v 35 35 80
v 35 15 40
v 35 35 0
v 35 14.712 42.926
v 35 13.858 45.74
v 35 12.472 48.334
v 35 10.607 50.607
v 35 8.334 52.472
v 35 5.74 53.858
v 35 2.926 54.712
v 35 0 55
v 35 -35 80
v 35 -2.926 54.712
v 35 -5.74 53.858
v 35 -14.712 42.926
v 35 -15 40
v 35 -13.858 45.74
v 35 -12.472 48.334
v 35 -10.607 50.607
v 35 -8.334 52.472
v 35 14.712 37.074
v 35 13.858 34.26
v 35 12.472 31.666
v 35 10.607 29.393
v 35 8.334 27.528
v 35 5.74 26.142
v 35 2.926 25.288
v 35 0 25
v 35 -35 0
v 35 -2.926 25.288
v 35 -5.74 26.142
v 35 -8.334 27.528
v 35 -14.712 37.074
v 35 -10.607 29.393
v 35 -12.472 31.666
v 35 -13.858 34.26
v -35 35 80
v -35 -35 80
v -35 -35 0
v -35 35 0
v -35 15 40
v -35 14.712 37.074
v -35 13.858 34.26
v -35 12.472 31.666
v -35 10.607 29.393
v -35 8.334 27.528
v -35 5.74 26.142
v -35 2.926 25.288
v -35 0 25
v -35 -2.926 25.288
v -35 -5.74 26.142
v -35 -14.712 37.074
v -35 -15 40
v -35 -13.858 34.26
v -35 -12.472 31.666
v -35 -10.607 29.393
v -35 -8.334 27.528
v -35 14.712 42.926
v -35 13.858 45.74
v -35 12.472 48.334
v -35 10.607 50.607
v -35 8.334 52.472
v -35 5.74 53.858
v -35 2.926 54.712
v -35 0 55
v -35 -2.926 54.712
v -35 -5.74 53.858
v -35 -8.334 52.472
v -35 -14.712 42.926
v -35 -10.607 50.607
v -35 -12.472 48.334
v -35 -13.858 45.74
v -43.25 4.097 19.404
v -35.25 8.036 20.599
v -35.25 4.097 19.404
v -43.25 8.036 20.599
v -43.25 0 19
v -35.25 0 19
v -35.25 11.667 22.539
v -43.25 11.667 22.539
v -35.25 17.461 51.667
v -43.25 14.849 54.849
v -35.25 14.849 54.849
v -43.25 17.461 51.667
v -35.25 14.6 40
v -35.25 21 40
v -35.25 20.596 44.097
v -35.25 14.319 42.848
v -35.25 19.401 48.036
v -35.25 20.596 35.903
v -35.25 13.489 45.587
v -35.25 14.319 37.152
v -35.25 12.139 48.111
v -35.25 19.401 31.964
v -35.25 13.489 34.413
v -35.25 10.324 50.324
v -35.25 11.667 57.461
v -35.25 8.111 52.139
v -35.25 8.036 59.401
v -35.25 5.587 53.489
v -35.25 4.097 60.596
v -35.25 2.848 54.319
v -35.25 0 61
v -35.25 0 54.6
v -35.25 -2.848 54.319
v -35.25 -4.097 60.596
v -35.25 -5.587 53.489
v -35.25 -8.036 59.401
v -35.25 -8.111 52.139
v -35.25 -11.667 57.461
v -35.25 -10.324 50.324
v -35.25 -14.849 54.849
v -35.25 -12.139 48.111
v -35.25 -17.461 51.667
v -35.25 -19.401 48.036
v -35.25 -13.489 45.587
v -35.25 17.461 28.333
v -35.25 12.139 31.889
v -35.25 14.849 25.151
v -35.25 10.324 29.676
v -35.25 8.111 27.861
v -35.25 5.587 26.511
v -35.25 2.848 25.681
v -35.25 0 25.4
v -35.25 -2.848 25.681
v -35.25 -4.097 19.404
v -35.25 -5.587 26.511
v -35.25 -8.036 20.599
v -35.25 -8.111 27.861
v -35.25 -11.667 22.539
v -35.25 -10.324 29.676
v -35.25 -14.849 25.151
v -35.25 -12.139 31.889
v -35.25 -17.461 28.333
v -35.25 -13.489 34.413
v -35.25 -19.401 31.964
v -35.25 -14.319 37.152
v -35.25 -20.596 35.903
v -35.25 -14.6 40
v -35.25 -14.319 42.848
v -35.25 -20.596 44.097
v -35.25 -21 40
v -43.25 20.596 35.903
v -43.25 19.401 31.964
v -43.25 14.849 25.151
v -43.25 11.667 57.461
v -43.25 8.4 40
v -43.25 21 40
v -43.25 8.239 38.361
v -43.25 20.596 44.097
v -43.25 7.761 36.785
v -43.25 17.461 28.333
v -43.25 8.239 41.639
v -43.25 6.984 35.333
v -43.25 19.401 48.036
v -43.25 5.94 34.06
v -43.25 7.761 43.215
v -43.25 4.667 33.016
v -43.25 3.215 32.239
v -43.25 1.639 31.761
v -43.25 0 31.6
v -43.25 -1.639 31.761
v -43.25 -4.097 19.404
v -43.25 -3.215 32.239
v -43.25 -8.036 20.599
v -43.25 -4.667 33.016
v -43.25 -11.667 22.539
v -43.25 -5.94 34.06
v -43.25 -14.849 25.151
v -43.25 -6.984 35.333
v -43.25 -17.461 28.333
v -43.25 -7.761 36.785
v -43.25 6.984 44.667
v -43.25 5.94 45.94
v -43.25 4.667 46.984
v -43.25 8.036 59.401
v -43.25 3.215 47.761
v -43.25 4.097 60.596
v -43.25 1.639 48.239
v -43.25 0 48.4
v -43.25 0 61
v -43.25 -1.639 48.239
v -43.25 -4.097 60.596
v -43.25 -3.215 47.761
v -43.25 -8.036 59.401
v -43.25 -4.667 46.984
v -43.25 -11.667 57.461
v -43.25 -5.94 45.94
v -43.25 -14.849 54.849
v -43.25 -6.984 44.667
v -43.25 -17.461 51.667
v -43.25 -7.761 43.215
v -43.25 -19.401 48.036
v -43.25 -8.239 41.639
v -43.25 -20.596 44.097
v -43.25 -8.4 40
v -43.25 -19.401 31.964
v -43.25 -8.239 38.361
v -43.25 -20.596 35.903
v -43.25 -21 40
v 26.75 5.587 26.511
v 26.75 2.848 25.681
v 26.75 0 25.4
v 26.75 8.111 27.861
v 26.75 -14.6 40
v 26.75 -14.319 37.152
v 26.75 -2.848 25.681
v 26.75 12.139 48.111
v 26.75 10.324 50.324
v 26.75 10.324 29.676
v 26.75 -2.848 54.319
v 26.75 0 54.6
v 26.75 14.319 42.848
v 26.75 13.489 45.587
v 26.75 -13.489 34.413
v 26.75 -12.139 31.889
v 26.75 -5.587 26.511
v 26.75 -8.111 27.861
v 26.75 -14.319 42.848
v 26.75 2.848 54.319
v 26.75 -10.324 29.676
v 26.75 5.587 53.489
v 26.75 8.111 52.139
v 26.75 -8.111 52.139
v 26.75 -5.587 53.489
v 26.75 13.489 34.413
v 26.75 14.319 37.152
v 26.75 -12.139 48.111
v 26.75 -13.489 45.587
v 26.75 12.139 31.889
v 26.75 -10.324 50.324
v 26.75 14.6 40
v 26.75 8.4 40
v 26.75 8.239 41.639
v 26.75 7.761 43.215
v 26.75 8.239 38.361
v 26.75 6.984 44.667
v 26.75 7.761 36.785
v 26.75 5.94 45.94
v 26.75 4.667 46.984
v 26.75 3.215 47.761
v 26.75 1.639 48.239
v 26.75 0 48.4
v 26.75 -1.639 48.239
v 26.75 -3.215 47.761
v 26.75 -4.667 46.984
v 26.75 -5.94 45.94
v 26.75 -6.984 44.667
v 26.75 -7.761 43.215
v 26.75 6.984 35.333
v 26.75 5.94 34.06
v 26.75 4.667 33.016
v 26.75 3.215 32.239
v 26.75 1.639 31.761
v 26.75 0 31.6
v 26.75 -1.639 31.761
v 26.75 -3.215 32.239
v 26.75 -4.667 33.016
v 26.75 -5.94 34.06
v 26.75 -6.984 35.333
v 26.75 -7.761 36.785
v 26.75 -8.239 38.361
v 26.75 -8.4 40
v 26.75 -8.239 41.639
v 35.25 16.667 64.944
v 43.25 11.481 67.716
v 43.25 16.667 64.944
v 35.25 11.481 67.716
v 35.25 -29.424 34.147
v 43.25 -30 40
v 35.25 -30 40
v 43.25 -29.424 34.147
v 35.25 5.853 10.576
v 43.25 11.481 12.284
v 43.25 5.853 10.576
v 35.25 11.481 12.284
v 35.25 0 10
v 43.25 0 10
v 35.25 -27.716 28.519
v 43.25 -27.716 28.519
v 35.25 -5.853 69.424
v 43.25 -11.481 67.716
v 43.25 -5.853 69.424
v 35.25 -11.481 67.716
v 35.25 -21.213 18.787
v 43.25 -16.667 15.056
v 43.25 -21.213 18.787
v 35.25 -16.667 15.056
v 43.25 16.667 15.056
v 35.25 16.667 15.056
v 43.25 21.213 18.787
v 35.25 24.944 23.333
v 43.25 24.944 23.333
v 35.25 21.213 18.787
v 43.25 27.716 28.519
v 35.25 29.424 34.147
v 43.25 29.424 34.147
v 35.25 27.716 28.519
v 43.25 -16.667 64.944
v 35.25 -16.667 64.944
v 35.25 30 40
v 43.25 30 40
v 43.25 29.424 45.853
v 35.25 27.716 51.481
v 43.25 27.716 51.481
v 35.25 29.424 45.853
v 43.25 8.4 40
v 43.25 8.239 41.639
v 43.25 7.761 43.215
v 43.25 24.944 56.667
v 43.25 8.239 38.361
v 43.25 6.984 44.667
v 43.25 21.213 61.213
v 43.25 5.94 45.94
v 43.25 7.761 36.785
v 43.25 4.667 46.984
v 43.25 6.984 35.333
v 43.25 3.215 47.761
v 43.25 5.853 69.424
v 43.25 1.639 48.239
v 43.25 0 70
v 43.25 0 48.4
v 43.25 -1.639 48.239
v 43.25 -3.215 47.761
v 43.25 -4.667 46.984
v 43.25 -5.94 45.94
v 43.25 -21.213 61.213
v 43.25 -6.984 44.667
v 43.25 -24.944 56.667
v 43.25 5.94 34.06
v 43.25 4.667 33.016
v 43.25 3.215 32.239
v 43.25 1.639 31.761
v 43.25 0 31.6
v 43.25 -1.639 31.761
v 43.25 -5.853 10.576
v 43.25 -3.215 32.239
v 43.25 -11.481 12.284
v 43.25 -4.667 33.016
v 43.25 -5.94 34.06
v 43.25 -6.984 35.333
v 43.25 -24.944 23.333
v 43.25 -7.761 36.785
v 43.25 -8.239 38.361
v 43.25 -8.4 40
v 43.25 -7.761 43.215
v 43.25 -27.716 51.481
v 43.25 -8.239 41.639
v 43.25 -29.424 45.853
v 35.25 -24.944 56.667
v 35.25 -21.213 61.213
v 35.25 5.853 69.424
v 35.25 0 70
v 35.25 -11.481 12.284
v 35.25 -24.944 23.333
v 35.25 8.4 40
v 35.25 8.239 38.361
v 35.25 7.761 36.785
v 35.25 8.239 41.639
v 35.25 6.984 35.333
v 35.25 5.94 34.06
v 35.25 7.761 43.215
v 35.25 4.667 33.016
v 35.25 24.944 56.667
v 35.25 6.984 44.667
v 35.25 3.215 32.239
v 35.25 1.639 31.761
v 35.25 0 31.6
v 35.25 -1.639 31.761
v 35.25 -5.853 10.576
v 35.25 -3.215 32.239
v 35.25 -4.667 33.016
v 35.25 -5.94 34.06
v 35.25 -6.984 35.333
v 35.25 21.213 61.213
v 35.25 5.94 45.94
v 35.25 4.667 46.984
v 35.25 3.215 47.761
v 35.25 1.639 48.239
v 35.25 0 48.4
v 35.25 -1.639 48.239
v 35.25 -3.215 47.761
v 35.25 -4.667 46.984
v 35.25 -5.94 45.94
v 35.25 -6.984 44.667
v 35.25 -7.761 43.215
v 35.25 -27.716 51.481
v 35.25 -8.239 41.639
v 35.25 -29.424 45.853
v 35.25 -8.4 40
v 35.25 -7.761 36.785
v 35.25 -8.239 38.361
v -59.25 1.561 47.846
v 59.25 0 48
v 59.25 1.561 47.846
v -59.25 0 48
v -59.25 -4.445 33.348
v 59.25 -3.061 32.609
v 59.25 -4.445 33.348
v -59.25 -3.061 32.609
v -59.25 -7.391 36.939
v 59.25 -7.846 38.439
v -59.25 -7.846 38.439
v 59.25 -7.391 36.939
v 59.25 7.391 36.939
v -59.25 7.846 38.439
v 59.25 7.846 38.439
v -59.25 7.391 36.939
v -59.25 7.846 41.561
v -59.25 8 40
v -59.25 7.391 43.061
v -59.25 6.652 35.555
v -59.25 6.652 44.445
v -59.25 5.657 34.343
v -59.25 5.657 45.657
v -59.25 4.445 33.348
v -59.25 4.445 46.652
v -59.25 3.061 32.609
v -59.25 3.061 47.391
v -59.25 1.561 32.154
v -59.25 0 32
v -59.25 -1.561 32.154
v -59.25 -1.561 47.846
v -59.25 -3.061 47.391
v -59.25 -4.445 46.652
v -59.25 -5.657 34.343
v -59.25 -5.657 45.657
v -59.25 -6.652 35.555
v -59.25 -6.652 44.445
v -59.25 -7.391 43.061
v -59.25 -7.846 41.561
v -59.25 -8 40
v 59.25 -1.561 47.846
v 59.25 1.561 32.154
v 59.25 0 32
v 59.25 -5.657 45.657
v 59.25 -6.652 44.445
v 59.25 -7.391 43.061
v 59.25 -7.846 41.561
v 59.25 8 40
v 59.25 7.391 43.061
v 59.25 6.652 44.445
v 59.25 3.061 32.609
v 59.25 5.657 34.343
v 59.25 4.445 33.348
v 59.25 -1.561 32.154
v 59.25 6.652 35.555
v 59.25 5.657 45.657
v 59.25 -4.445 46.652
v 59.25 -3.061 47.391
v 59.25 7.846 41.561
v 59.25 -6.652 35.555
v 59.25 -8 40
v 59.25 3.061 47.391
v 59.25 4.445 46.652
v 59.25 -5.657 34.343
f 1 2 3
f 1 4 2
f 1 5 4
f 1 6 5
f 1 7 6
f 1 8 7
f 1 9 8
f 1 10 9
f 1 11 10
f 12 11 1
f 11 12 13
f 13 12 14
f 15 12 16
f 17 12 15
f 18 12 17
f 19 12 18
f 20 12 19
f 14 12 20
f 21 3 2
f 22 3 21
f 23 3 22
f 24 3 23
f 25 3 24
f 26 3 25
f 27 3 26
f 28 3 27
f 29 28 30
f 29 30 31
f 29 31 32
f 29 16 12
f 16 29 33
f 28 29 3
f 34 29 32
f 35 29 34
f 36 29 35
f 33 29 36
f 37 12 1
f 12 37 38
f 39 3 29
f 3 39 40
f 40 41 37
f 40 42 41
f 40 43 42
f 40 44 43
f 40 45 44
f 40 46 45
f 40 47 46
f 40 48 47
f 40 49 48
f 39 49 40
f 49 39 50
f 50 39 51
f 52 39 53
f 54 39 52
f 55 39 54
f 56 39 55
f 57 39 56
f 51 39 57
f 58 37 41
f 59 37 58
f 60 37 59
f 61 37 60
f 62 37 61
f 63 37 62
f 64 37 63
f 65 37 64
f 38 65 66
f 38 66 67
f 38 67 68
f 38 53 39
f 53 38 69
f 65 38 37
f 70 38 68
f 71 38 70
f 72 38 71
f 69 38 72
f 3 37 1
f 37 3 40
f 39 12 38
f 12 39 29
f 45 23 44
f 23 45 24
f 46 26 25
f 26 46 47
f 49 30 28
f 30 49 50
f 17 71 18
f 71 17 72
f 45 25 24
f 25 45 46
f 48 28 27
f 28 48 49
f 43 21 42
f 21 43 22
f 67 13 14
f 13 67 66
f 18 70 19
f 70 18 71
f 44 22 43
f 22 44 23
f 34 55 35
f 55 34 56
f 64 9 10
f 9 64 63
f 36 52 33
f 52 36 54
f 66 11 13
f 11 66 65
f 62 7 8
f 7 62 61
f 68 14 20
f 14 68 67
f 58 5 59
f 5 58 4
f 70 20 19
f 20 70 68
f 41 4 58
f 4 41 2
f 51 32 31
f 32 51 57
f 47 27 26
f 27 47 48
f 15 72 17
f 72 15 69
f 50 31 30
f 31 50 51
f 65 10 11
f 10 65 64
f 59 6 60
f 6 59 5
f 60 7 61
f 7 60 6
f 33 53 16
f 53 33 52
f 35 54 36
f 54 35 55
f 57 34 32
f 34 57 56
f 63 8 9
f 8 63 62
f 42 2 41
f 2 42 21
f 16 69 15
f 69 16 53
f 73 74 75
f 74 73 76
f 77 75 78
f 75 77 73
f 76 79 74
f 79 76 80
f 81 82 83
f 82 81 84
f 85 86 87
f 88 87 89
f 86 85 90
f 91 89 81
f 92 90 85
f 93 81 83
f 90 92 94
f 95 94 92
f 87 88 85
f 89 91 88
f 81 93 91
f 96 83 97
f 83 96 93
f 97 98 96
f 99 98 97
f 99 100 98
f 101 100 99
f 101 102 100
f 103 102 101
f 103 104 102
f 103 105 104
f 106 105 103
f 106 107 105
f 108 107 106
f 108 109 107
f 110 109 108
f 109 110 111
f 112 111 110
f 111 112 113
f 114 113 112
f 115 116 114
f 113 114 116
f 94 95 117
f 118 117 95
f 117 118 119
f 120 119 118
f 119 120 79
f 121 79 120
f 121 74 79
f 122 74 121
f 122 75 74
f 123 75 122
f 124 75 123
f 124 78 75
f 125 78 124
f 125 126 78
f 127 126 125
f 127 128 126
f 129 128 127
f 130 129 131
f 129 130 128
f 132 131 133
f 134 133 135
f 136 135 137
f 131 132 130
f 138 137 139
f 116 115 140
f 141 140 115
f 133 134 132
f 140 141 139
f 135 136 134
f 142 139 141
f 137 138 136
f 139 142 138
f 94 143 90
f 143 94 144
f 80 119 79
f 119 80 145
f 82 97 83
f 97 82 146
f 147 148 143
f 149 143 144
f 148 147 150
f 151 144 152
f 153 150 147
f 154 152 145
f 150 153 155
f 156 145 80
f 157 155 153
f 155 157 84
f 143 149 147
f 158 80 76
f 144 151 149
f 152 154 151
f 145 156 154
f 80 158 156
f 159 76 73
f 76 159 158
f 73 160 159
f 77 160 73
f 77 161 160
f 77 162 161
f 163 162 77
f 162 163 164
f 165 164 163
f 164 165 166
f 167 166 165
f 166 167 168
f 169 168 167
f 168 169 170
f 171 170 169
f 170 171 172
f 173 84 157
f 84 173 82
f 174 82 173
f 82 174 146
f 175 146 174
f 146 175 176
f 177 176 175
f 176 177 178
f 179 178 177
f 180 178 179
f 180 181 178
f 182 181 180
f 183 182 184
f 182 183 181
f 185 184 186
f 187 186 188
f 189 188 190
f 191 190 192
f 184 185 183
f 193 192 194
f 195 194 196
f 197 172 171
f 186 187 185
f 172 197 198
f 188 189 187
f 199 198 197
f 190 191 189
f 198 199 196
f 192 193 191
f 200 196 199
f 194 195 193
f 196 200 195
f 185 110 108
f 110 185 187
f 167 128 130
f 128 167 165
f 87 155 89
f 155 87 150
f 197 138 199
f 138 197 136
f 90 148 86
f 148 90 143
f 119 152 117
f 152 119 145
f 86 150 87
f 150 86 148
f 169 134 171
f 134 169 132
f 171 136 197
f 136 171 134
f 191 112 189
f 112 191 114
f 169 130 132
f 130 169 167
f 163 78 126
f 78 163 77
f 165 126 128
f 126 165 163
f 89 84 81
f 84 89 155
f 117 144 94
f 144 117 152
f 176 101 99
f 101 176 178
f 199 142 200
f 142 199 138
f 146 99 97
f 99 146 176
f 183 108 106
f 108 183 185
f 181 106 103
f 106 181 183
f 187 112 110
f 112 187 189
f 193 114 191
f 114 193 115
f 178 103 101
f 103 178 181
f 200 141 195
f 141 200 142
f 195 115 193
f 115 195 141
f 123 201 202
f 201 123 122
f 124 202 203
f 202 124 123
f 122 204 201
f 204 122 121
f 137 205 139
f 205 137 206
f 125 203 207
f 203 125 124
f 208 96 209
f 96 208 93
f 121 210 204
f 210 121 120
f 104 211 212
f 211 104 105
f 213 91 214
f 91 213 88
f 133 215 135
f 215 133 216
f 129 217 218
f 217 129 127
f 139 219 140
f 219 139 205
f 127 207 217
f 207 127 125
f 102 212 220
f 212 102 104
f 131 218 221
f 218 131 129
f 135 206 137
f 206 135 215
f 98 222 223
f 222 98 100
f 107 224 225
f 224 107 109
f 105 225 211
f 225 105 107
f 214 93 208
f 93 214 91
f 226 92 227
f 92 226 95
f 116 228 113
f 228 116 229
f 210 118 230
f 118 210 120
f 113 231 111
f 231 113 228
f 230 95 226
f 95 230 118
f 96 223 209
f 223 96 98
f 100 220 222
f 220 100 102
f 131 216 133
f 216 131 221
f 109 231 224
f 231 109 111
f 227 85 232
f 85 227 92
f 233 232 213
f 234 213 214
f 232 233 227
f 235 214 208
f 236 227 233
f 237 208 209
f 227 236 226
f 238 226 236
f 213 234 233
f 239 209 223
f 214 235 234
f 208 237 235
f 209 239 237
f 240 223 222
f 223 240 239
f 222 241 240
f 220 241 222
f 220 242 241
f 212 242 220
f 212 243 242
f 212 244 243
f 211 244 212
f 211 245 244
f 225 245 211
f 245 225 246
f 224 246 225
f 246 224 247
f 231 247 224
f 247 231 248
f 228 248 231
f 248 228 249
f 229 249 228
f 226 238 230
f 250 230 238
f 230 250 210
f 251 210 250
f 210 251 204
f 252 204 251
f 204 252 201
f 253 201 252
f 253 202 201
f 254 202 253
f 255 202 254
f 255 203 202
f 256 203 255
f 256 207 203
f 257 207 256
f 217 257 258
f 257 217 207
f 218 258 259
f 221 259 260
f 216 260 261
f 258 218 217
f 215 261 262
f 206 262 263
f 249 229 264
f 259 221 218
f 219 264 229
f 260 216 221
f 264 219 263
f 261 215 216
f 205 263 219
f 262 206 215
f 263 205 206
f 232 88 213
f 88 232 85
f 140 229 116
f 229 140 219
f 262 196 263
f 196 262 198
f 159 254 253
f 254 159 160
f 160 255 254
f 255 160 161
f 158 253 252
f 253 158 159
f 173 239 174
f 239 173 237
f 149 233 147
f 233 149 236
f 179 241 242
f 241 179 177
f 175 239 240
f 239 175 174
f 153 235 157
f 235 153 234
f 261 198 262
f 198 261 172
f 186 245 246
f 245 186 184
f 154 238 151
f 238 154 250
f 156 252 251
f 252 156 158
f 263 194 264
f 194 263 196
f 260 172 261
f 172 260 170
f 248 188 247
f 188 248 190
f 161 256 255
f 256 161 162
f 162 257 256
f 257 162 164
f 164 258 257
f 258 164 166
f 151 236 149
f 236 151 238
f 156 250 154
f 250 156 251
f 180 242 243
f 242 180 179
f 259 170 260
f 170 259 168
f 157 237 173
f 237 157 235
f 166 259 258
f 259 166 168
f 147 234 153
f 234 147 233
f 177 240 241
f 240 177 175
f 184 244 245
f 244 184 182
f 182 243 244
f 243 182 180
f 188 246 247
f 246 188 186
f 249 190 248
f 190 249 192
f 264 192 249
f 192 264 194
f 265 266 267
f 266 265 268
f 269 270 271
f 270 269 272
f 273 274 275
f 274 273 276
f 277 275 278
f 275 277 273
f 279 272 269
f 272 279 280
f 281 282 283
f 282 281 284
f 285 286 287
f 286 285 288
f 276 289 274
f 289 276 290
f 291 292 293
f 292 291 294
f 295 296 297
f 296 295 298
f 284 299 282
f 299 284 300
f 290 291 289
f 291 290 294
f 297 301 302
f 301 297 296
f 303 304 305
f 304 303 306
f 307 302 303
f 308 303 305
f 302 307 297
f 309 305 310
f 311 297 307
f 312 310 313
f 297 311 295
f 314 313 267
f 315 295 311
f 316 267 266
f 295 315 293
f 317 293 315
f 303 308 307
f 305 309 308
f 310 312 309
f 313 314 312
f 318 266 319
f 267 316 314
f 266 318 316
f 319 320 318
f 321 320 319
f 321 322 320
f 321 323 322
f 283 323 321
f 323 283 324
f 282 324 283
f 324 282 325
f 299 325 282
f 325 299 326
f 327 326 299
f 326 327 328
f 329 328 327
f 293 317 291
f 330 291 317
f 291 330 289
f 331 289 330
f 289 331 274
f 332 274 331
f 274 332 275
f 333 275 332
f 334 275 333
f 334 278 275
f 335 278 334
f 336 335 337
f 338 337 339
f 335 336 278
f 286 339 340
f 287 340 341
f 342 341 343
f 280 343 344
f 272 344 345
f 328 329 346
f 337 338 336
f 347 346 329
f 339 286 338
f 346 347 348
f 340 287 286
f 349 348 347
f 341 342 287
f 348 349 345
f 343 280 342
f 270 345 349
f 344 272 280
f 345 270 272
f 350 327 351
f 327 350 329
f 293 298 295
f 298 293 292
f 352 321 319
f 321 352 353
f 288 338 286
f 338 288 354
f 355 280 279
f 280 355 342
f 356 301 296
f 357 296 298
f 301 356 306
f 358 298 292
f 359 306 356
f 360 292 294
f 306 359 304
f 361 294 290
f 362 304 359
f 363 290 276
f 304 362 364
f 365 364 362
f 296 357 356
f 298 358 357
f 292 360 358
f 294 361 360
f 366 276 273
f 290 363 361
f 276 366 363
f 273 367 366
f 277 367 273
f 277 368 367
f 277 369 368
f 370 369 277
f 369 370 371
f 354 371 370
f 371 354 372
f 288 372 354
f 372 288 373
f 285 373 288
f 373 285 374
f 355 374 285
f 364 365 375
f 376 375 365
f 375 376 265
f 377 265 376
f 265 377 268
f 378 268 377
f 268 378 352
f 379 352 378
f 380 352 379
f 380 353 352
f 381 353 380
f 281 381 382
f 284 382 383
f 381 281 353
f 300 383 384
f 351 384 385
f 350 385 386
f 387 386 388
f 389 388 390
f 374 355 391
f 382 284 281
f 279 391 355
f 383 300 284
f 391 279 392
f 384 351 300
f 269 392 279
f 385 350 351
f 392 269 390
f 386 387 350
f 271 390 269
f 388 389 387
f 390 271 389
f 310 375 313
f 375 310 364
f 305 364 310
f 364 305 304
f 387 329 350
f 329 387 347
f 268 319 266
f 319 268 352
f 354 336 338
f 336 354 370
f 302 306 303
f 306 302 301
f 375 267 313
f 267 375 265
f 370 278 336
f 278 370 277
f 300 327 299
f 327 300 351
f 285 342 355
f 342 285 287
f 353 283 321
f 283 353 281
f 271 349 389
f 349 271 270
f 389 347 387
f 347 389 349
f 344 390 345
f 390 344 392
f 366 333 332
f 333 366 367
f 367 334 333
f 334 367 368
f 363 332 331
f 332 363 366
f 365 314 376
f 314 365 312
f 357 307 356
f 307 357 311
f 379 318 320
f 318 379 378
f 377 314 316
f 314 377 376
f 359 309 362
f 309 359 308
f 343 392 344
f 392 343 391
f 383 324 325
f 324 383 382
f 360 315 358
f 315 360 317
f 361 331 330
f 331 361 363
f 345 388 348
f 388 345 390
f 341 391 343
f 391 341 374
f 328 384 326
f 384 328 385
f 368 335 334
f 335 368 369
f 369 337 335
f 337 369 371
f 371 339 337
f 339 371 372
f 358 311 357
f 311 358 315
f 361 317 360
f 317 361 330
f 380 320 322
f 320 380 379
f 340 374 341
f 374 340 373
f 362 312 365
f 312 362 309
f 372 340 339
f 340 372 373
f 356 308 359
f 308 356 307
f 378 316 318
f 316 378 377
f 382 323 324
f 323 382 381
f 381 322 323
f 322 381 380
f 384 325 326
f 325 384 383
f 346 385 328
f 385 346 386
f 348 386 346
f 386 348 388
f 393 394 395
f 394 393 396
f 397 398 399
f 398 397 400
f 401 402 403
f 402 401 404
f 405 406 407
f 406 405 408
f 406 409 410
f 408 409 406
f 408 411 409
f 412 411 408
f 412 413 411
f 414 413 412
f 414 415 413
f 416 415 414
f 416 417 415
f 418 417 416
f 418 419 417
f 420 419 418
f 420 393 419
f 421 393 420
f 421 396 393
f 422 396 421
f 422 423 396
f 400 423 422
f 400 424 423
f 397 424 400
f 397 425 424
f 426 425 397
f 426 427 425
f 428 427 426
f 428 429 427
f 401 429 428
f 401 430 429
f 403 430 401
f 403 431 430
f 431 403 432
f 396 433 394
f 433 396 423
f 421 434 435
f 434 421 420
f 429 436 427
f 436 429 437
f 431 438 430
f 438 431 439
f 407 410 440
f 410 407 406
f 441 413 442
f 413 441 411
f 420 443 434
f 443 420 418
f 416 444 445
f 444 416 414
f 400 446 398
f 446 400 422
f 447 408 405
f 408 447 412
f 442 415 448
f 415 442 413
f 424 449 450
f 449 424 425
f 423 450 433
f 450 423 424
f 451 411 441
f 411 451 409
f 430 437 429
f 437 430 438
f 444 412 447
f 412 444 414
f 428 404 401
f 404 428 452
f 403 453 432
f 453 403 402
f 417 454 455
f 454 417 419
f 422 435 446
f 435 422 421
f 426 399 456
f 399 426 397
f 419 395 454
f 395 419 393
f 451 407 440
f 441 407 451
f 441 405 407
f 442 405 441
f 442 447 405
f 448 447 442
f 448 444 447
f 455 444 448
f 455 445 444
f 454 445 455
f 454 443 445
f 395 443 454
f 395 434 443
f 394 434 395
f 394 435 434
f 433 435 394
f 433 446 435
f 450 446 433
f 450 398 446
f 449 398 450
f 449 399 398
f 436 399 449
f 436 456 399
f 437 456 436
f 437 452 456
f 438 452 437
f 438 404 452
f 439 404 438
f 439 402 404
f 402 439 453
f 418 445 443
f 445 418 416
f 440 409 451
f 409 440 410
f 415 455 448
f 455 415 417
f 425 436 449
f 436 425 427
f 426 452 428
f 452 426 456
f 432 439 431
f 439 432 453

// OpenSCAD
$fn = 32;

// ------------------------------------------------------------------------
// Bushed housing: 70 x 70 x 80 mm housing, bushing d29.2
// Every part is its own module, assembly() places them once.
// ------------------------------------------------------------------------

// --- part 1 ---
module housing() {
  difference() {
    translate([-35, -35, 0]) cube([70, 70, 80]);
    translate([0, 0, 40]) rotate([0, 90, 0]) cylinder(h = 72, d = 30, center = true);
  }
}

// --- part 2 ---
module bushing() {
  difference() {
    union() {
      cylinder(h = 8, d = 42);
      translate([0, 0, 8]) cylinder(h = 62, d = 29.2);
    }
    translate([0, 0, -1]) cylinder(h = 72, d = 16.8);
  }
}

// --- part 3 ---
module shaft() {
  translate([0, 0, -59.25]) cylinder(h = 118.5, d = 16);
}

// --- part 4 ---
module cover() {
  difference() {
    cylinder(h = 8, d = 60);
    translate([0, 0, -1]) cylinder(h = 10, d = 16.8);
  }
}

// --- assembly ---
module assembly() {
  translate([0, 0, 0]) rotate([0, 0, 0]) housing();
  translate([-43.25, 0, 40]) rotate([0, 90, 0]) bushing();
  translate([0, 0, 40]) rotate([0, 90, 0]) shaft();
  translate([35.25, 0, 40]) rotate([0, 90, 0]) cover();
}

assembly();
